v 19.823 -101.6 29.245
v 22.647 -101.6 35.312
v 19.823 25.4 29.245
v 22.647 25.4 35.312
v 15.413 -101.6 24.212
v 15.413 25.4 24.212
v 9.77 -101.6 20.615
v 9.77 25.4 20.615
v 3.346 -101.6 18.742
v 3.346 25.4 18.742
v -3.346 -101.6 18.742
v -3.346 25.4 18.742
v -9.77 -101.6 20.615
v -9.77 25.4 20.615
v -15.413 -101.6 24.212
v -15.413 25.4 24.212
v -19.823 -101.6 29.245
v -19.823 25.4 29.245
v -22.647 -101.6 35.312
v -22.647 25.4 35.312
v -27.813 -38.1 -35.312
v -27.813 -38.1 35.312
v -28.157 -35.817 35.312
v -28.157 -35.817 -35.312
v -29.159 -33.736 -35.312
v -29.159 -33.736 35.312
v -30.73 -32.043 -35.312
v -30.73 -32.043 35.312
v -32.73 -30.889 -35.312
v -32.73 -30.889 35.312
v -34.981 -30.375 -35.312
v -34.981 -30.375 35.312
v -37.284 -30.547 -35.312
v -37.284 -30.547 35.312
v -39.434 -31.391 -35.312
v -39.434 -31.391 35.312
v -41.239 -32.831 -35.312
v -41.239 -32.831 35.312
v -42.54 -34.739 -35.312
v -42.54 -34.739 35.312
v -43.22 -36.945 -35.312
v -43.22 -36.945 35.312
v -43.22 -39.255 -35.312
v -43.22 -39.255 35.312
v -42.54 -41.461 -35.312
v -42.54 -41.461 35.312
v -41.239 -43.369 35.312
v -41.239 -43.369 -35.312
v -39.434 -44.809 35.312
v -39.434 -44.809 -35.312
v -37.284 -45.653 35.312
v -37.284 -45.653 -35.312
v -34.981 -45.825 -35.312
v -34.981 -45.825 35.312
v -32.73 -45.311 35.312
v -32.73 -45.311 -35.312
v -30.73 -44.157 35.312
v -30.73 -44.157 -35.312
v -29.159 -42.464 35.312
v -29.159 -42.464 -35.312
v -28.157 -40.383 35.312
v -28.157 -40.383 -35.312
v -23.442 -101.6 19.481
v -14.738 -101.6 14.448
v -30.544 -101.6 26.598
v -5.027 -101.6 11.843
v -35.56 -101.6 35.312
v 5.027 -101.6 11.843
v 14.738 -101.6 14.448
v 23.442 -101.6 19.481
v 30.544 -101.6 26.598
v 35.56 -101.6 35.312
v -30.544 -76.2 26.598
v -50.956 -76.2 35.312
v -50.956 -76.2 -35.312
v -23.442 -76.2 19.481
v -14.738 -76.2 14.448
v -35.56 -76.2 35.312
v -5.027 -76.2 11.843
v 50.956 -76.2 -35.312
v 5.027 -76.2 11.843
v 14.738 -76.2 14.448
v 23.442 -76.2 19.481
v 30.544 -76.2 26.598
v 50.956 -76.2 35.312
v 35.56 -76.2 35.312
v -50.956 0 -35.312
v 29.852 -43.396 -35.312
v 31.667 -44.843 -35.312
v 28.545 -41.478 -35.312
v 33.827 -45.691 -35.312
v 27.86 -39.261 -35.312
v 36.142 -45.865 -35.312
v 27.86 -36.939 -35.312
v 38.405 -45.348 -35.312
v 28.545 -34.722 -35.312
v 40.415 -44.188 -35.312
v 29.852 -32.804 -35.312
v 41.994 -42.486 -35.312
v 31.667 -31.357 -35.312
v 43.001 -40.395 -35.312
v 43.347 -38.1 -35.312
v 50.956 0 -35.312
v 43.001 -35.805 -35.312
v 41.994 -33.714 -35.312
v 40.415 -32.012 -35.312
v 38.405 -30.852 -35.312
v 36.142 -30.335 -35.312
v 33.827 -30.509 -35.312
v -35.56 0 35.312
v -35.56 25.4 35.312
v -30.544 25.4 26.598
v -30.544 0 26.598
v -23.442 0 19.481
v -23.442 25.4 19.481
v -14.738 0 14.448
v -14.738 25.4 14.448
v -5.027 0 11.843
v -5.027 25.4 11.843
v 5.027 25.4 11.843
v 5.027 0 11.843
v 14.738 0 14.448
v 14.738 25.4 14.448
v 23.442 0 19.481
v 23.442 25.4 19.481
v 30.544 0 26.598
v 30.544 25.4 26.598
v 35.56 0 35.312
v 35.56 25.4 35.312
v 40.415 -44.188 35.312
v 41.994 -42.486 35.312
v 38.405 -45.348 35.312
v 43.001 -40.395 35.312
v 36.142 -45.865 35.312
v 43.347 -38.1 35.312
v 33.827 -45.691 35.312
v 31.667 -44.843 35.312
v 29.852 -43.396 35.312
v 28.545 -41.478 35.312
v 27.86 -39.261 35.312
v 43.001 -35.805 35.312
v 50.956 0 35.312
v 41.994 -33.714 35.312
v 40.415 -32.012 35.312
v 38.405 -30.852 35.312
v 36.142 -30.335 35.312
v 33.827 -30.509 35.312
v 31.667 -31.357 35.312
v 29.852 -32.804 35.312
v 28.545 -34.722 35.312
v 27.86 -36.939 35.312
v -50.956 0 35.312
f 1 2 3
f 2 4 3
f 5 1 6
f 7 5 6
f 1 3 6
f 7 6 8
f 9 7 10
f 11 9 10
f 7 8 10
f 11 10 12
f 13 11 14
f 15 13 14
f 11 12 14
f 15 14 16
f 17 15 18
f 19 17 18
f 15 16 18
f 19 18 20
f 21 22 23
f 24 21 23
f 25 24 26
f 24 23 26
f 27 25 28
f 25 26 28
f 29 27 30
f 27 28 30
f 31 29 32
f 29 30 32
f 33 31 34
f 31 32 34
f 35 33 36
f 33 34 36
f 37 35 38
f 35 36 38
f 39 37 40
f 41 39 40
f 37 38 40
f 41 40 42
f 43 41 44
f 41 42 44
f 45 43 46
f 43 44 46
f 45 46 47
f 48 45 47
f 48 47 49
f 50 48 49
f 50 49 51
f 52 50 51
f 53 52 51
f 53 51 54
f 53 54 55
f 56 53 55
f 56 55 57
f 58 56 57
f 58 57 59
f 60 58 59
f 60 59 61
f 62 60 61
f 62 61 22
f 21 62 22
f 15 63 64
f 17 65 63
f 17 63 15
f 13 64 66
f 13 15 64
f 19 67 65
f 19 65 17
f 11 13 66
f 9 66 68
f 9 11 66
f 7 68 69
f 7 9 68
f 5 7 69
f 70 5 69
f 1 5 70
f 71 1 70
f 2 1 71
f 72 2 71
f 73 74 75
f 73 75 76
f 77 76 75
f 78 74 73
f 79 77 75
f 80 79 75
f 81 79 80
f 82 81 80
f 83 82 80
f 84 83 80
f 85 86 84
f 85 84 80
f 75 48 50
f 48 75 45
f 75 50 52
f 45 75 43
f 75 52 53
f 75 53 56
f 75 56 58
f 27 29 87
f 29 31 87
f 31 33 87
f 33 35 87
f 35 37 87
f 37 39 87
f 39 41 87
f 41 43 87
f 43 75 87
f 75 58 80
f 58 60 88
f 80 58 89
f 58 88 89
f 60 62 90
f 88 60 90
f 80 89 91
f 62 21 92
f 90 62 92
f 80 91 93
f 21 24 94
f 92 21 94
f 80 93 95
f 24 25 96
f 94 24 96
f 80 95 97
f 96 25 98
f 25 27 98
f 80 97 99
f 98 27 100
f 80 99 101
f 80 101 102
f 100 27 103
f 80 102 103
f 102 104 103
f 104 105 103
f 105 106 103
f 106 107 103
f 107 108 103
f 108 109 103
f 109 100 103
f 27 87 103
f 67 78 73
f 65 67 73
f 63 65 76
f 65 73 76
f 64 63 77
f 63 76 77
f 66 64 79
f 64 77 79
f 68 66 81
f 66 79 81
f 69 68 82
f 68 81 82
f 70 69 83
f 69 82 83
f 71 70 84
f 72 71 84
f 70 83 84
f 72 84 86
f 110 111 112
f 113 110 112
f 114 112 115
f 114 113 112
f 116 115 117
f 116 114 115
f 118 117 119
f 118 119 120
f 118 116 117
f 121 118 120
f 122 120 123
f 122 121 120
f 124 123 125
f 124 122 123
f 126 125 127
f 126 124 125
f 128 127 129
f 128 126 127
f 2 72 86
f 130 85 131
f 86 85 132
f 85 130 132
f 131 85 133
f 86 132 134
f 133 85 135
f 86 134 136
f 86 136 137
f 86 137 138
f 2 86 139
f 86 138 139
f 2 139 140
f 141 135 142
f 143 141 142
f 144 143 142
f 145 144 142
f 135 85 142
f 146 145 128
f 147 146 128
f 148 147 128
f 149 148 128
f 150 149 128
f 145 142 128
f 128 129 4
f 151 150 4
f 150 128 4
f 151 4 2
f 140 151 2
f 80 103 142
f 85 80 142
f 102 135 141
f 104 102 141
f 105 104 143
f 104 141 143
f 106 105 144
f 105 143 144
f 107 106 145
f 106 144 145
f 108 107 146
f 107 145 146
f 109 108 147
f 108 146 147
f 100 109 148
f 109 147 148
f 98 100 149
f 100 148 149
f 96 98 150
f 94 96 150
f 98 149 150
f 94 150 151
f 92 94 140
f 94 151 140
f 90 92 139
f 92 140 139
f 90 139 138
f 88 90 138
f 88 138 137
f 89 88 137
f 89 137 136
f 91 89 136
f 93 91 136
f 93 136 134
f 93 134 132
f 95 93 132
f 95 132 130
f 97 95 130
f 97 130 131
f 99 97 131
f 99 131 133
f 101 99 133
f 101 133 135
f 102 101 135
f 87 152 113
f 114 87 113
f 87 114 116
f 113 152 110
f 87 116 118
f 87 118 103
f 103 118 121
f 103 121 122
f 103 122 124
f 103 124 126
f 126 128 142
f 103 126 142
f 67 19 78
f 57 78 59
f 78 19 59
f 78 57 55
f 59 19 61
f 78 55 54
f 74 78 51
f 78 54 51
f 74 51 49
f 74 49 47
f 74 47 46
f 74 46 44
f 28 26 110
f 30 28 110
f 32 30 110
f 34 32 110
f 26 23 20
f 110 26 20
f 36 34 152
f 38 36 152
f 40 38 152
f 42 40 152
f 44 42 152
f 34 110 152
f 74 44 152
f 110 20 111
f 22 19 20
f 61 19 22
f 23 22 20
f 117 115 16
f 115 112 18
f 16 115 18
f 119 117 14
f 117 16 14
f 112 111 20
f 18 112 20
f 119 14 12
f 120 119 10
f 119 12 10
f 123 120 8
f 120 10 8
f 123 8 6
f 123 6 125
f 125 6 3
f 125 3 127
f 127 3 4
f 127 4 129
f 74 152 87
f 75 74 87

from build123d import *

# Parameters (mm, degrees)
F1_DEPTH      = 76.2
F2_DEPTH      = 25.4
F2_DEPTH_BACK = 101.6
F3_R          = 7.7865248509
F4_DEPTH      = 101.6
F5_R          = 7.747
F6_DEPTH      = 101.6


with BuildPart() as f1:
    # F0 (on Front) → F1 (new body)
    with BuildSketch(Plane.XZ):
        with BuildLine():
            Line((-50.9560853243, -35.3116765618), (50.9560853243, -35.3116765618))
            Line((50.9560853243, -35.3116765618), (50.9560853243, 35.3116765618))
            Line((50.9560853243, 35.3116765618), (35.56, 35.3116765618))
            ThreePointArc((35.56, 35.3116765618), (0, 11.5130765942), (-35.56, 35.3116765618))
            Line((-35.56, 35.3116765618), (-50.9560853243, 35.3116765618))
            Line((-50.9560853243, 35.3116765618), (-50.9560853243, -35.3116765618))
        make_face()
    extrude(amount=F1_DEPTH)

    # F0 (on Front) → F2 (join, two sides)
    with BuildSketch(Plane.XZ) as f2_sk:
        with BuildLine():
            ThreePointArc((-35.56, 35.3116765618), (0, 11.5130765942), (35.56, 35.3116765618))
            Line((35.56, 35.3116765618), (22.6471517235, 35.3116765618))
            ThreePointArc((22.6471517235, 35.3116765618), (0, 18.5039060672), (-22.6471517235, 35.3116765618))
            Line((-22.6471517235, 35.3116765618), (-35.56, 35.3116765618))
        make_face()
    extrude(amount=-F2_DEPTH)
    extrude(f2_sk.sketch, amount=F2_DEPTH_BACK)

    # F3 (on face) → F4 (cut)
    with BuildSketch(Plane.XY.offset(35.3116765618)):
        with Locations((35.56, -38.1)):
            Circle(F3_R)
    extrude(amount=-F4_DEPTH, mode=Mode.SUBTRACT)

    # F5 (on face) → F6 (cut)
    with BuildSketch(Plane.XY.offset(35.3116765618)):
        with Locations((-35.56, -38.1)):
            Circle(F5_R)
    extrude(amount=-F6_DEPTH, mode=Mode.SUBTRACT)


solid = f1.part
